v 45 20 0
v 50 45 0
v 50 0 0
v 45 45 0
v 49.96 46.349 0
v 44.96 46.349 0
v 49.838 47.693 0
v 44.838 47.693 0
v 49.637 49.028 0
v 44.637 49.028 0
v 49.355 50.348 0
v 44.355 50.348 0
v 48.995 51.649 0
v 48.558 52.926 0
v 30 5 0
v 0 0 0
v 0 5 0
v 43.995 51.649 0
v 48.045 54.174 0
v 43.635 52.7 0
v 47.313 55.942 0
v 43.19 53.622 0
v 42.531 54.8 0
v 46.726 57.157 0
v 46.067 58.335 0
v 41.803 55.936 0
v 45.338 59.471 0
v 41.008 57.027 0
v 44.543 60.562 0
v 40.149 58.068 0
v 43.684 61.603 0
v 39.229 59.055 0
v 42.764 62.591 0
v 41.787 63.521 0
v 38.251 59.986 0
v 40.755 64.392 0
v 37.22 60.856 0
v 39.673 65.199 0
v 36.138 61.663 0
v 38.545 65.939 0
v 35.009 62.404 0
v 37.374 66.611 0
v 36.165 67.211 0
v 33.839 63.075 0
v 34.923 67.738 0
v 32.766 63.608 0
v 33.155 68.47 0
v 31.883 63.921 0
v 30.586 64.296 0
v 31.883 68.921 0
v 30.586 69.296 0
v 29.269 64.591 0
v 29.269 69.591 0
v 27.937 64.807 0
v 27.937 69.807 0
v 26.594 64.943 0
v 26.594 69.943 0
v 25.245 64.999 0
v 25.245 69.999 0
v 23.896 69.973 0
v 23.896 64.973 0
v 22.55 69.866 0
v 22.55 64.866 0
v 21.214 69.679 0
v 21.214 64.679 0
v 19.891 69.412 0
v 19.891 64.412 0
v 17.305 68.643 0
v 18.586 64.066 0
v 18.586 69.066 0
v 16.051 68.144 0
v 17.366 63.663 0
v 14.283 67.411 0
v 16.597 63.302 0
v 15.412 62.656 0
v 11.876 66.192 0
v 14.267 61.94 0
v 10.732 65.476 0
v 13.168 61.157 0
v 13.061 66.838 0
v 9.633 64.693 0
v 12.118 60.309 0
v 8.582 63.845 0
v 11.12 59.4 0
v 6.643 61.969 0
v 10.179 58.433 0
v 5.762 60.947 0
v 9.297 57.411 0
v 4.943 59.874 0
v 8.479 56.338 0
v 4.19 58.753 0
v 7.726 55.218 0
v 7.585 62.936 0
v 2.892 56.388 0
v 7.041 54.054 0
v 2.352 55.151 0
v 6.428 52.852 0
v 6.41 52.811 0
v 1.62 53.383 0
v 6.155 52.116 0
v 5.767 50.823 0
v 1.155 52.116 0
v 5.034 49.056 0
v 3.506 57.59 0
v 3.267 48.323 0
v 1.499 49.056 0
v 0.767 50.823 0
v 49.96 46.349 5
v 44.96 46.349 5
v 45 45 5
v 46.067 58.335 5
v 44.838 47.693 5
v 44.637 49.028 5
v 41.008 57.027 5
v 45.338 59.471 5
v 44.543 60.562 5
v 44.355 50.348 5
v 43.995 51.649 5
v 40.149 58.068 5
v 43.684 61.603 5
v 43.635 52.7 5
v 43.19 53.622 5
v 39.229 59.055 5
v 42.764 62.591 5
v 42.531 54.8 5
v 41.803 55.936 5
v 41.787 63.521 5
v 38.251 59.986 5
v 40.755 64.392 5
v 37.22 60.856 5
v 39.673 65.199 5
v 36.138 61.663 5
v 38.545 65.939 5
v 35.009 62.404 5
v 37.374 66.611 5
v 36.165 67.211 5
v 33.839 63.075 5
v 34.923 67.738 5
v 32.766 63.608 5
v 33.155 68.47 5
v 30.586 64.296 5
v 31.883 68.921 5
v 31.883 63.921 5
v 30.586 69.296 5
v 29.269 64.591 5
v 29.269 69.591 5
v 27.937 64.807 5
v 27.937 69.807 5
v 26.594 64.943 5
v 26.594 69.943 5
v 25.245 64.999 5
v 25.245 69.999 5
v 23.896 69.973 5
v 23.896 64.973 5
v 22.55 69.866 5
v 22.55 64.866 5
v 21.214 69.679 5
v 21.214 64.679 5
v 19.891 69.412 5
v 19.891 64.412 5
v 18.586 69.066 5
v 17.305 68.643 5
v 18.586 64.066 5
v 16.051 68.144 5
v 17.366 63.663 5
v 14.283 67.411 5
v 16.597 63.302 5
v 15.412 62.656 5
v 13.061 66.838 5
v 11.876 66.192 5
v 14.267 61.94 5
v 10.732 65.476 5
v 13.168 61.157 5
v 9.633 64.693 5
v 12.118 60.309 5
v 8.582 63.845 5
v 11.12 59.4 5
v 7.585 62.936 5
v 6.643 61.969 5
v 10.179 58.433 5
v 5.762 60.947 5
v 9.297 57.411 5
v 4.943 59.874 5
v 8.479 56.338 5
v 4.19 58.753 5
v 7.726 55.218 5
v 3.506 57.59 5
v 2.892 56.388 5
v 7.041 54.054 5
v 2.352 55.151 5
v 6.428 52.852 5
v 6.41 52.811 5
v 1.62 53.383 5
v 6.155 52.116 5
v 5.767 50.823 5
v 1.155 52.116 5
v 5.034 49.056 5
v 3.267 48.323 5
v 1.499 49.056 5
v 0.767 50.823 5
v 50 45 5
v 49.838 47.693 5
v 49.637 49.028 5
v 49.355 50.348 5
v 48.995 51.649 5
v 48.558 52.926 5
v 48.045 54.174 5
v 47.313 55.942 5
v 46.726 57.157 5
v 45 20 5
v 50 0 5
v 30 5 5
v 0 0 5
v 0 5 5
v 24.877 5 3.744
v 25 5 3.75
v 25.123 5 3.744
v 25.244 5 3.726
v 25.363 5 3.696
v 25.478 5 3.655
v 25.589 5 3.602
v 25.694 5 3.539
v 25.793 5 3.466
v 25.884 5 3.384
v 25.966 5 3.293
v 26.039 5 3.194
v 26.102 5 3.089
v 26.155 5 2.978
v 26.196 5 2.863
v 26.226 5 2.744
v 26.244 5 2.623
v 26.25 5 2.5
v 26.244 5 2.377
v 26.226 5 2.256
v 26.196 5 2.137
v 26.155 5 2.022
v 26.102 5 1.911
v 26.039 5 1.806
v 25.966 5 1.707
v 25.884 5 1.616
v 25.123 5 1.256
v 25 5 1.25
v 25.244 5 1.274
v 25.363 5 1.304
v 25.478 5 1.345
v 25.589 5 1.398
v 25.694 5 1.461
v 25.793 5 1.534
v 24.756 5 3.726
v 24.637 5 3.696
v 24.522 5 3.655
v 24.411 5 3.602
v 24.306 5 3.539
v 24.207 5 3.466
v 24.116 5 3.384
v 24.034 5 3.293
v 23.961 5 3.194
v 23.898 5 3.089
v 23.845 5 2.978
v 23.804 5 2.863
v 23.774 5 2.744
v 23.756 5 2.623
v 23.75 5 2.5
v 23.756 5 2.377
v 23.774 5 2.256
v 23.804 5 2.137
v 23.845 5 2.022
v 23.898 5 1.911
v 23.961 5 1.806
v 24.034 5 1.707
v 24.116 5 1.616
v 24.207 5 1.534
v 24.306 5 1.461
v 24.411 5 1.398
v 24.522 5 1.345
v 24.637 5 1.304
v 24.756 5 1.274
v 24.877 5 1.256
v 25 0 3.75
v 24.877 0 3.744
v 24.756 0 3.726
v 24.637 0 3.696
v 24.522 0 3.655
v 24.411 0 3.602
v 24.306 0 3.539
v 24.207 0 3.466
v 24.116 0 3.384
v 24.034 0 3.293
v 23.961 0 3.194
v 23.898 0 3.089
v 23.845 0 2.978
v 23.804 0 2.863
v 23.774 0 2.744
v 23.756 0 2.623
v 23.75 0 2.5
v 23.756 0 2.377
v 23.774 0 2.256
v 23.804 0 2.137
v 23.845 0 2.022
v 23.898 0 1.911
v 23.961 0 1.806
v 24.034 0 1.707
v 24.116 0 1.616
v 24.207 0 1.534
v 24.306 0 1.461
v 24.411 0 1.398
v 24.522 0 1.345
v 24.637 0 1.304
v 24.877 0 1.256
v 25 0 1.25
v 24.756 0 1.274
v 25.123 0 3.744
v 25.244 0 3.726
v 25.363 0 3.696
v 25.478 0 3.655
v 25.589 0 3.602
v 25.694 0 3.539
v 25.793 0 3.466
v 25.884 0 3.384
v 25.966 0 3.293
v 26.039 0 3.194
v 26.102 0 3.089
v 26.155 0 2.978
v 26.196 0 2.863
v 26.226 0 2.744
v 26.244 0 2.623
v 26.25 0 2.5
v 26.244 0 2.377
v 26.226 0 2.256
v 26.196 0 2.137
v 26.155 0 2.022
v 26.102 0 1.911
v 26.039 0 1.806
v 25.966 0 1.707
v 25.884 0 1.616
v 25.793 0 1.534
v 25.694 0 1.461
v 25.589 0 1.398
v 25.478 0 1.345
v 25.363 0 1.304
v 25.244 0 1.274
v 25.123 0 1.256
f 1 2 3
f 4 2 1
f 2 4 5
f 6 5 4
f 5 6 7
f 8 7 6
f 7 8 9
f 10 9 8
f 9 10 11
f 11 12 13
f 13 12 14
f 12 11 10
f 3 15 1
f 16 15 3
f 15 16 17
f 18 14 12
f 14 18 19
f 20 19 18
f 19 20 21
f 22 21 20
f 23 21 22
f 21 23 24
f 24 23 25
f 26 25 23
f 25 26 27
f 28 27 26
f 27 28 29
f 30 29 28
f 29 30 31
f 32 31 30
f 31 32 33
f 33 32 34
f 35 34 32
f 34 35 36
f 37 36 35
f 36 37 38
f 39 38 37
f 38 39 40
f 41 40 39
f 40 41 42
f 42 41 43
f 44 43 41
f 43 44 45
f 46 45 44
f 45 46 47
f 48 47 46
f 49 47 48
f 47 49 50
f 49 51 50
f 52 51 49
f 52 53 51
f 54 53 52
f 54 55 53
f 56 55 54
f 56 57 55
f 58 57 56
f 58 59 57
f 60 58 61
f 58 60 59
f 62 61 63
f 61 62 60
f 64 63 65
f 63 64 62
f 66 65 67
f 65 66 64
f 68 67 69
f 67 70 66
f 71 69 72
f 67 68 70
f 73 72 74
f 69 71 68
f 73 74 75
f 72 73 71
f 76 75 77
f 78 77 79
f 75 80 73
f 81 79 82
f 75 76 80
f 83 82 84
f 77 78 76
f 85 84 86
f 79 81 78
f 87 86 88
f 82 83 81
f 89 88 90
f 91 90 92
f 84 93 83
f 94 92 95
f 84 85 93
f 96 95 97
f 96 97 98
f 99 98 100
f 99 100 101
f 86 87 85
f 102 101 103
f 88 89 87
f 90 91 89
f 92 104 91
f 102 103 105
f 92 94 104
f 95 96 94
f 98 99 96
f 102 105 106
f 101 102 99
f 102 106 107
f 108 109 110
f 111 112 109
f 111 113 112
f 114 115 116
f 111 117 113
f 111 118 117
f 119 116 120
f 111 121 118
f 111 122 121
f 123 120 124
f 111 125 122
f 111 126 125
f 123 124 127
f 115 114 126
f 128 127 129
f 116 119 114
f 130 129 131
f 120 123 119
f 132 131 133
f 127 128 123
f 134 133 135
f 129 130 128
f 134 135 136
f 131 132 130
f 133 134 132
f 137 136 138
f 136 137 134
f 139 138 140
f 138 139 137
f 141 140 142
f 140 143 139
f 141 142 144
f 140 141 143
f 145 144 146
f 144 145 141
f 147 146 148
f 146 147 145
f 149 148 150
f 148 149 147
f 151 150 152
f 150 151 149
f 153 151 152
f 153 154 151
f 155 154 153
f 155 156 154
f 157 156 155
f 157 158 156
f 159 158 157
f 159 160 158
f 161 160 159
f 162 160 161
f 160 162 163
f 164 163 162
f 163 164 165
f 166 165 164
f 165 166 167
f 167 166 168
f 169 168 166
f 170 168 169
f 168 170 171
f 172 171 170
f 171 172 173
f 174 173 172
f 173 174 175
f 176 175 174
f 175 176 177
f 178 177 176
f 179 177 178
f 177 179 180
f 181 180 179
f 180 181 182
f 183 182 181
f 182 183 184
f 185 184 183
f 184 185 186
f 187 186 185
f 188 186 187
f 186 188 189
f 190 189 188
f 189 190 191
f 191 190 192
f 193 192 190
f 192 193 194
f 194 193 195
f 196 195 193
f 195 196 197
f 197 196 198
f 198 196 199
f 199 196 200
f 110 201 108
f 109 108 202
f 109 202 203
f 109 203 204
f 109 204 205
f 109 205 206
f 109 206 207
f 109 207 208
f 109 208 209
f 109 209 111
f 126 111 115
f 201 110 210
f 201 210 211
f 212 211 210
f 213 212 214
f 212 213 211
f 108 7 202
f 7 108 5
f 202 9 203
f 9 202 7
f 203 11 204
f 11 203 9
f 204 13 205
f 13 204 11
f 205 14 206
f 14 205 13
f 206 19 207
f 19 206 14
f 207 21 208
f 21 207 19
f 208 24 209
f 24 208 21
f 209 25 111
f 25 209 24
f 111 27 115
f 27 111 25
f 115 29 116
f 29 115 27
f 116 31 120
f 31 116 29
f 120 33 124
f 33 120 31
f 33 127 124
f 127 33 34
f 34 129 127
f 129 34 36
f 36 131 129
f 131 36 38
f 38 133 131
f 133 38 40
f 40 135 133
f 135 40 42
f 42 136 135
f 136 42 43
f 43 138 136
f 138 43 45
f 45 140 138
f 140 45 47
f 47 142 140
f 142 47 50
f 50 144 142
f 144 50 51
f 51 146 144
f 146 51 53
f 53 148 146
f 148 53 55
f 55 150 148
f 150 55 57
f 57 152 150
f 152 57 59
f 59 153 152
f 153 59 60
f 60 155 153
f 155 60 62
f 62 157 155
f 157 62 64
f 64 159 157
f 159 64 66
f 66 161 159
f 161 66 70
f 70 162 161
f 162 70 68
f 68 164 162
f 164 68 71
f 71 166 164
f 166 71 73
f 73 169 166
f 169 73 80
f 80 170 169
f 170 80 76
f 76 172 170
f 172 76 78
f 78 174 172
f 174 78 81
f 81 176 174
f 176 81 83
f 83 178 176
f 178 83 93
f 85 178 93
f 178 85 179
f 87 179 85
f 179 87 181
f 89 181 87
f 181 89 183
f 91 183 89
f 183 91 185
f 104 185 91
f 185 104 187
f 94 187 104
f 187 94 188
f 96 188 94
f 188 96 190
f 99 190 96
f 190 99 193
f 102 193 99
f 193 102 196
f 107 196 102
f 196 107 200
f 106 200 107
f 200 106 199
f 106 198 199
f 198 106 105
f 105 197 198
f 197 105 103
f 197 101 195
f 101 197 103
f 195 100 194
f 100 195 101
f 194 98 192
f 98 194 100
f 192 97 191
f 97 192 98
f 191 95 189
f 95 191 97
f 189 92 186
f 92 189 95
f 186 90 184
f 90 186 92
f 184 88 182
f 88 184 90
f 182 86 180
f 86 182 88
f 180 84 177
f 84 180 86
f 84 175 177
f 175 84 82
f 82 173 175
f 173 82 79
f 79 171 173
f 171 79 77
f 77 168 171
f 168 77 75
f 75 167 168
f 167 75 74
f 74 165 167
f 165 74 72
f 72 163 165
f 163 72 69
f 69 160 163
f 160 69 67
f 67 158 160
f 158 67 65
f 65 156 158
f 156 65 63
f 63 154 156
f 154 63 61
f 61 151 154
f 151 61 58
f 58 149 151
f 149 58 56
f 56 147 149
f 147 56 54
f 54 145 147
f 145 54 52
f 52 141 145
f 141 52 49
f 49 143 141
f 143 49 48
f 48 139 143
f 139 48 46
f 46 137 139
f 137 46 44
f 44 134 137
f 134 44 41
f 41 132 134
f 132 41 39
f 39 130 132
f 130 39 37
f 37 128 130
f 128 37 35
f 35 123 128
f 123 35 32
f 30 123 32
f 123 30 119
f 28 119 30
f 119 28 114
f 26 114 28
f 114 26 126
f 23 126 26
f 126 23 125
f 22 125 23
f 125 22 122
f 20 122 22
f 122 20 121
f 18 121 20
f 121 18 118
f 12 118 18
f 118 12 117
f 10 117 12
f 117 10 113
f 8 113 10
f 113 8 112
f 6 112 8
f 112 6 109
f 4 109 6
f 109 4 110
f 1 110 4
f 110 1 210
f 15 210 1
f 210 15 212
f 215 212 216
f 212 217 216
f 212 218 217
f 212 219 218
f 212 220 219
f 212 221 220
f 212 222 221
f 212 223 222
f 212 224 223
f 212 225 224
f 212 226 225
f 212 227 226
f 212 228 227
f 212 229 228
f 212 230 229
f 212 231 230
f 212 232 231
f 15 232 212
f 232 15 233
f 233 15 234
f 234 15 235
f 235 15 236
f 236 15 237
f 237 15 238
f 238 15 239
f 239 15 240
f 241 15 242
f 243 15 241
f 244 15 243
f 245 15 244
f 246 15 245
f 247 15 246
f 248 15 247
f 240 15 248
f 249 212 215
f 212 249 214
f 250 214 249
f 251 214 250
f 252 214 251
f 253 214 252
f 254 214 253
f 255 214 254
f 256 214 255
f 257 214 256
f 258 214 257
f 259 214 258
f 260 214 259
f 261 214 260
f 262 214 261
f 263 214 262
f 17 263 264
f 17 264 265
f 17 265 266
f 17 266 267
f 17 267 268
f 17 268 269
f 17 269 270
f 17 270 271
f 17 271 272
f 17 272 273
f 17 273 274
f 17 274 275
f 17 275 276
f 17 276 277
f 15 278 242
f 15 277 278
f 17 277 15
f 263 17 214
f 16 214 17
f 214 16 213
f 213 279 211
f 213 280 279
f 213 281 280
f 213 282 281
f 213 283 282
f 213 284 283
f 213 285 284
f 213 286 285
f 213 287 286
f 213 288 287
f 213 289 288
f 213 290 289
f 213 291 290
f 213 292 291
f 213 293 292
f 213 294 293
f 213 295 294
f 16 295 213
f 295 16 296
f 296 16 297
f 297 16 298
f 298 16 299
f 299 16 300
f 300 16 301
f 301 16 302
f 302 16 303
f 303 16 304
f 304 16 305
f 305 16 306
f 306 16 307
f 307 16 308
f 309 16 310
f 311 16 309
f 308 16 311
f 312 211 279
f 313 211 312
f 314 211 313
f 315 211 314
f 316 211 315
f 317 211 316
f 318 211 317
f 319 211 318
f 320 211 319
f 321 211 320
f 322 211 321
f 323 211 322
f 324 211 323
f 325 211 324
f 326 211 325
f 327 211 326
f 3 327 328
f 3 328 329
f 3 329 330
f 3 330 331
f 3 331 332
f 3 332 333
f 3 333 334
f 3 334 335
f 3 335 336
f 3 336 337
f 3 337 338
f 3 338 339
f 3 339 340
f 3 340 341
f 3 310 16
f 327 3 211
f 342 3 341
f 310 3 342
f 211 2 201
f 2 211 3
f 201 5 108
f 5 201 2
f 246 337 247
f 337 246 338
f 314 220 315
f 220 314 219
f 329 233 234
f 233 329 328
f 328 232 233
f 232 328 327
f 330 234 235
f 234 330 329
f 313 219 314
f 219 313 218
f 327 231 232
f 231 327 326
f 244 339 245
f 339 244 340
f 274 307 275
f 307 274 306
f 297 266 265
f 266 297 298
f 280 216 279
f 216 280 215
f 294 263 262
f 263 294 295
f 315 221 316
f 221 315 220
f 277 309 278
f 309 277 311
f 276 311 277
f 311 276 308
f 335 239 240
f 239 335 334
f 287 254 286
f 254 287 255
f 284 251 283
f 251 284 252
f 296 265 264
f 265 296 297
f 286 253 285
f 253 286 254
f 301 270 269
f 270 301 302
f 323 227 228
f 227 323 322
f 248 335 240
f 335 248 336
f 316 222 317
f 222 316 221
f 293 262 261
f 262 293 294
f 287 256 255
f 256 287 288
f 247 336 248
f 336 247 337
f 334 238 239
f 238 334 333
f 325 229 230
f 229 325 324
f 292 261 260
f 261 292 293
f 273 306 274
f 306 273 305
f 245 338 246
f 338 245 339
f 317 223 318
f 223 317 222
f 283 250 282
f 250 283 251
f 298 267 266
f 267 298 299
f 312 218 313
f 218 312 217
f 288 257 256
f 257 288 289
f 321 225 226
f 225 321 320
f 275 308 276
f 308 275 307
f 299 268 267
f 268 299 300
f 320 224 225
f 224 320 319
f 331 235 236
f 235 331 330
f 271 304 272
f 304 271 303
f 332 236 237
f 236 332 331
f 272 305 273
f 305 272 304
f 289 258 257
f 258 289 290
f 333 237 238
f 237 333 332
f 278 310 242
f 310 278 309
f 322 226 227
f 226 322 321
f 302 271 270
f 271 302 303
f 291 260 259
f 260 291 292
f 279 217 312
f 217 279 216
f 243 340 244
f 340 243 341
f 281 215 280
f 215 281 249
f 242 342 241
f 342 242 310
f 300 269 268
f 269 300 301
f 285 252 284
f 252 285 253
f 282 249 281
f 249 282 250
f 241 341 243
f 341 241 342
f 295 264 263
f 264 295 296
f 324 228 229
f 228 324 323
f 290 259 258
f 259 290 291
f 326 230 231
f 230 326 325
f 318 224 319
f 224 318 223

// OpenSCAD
// Ceiling hook — parametric arch hook.
//
// Shape (side profile, extruded plate_width_mm in Y):
//
//         ╭────╮
//        ╱      ╲   ← half-circle arch
//       │        │
//  post │        │ post
//  ─────┴────────┴─── plate
//
// Two posts rise from each end of the plate.
// A perfect semicircle arch connects the top of the left post to the
// top of the right post, arching upward over the centre.
// Screw hole goes through the plate thickness (Z) at the plate centre.

$fn = 64;

// ── Parameters ───────────────────────────────────────────────────────────────
plate_length_mm = 50;
plate_width_mm  =  5;   // extrusion depth (Y)
plate_thick_mm  =  5;
post_height_mm  = 40;   // height of each post above the plate top surface
arch_thick_mm   =  5;   // cross-section of the arch arm

screw_dia_mm    =  2.5; // clearance hole through plate width (Y, left→right)
gusset_mm       = 15;   // leg length of the 45° gusset triangle at each post base

// ── Arch geometry ─────────────────────────────────────────────────────────────
// Arch centreline endpoints = centres of the two post top edges:
//   Left  post top centre: (plate_thick/2,              plate_thick + post_height)
//   Right post top centre: (plate_length - plate_thick/2, plate_thick + post_height)
//
// A perfect semicircle (180°) sits above those two points.

arch_cx = plate_length_mm / 2;                        // midpoint of the span
arch_cy = plate_thick_mm + post_height_mm;            // height of post tops
arch_r  = (plate_length_mm - plate_thick_mm) / 2;    // = half the inner span
// Arc goes from 180° (left post top) counterclockwise through 90° (crown)
// to 0° (right post top).
a_start = 165;
a_end   =   0;

echo(str("Arch: centre=(", arch_cx, ",", arch_cy, ")  R=", arch_r, " mm"));
echo(str("Crown height: ", arch_cy + arch_r, " mm above print bed"));

// ── 2D arc tube — hull of consecutive discs along the arc centreline ──────────
module arc_tube_2d(cx, cy, R, a1, a2, thick, steps = 48) {
    r = thick / 2;
    for (i = [0 : steps - 1]) {
        a  = a1 + i       * (a2 - a1) / steps;
        an = a1 + (i + 1) * (a2 - a1) / steps;
        hull() {
            translate([cx + R*cos(a),  cy + R*sin(a)])  circle(r = r, $fn = 8);
            translate([cx + R*cos(an), cy + R*sin(an)]) circle(r = r, $fn = 8);
        }
    }
}

// ── 2D side profile (X = plate length, Y = height) ───────────────────────────
module hook_profile_2d() {
    union() {
        // Plate
        square([plate_length_mm, plate_thick_mm]);

        // Left post
        //square([plate_thick_mm, plate_thick_mm + post_height_mm]);

        // Right post
        translate([plate_length_mm - plate_thick_mm, 0])
            square([plate_thick_mm, plate_thick_mm + post_height_mm]);

        // 45° gusset — inner corner of right post / plate junction
        translate([plate_length_mm - plate_thick_mm, plate_thick_mm])
            polygon([[0, 0],
                     [-gusset_mm, 0],
                     [0, gusset_mm]]);

        // Semicircle arch
        arc_tube_2d(arch_cx, arch_cy, arch_r, a_start, a_end, arch_thick_mm);
    }
}

// ── 3D model ──────────────────────────────────────────────────────────────────
difference() {
    linear_extrude(height = plate_width_mm, convexity = 6)
        hook_profile_2d();

    // Screw clearance hole through the plate width (Y, left→right), centred on
    // the plate length and thickness.
    translate([plate_length_mm / 2, -0.01, plate_thick_mm / 2])
        rotate([-90, 0, 0])
            cylinder(d = screw_dia_mm, h = plate_width_mm + 0.02);
}
